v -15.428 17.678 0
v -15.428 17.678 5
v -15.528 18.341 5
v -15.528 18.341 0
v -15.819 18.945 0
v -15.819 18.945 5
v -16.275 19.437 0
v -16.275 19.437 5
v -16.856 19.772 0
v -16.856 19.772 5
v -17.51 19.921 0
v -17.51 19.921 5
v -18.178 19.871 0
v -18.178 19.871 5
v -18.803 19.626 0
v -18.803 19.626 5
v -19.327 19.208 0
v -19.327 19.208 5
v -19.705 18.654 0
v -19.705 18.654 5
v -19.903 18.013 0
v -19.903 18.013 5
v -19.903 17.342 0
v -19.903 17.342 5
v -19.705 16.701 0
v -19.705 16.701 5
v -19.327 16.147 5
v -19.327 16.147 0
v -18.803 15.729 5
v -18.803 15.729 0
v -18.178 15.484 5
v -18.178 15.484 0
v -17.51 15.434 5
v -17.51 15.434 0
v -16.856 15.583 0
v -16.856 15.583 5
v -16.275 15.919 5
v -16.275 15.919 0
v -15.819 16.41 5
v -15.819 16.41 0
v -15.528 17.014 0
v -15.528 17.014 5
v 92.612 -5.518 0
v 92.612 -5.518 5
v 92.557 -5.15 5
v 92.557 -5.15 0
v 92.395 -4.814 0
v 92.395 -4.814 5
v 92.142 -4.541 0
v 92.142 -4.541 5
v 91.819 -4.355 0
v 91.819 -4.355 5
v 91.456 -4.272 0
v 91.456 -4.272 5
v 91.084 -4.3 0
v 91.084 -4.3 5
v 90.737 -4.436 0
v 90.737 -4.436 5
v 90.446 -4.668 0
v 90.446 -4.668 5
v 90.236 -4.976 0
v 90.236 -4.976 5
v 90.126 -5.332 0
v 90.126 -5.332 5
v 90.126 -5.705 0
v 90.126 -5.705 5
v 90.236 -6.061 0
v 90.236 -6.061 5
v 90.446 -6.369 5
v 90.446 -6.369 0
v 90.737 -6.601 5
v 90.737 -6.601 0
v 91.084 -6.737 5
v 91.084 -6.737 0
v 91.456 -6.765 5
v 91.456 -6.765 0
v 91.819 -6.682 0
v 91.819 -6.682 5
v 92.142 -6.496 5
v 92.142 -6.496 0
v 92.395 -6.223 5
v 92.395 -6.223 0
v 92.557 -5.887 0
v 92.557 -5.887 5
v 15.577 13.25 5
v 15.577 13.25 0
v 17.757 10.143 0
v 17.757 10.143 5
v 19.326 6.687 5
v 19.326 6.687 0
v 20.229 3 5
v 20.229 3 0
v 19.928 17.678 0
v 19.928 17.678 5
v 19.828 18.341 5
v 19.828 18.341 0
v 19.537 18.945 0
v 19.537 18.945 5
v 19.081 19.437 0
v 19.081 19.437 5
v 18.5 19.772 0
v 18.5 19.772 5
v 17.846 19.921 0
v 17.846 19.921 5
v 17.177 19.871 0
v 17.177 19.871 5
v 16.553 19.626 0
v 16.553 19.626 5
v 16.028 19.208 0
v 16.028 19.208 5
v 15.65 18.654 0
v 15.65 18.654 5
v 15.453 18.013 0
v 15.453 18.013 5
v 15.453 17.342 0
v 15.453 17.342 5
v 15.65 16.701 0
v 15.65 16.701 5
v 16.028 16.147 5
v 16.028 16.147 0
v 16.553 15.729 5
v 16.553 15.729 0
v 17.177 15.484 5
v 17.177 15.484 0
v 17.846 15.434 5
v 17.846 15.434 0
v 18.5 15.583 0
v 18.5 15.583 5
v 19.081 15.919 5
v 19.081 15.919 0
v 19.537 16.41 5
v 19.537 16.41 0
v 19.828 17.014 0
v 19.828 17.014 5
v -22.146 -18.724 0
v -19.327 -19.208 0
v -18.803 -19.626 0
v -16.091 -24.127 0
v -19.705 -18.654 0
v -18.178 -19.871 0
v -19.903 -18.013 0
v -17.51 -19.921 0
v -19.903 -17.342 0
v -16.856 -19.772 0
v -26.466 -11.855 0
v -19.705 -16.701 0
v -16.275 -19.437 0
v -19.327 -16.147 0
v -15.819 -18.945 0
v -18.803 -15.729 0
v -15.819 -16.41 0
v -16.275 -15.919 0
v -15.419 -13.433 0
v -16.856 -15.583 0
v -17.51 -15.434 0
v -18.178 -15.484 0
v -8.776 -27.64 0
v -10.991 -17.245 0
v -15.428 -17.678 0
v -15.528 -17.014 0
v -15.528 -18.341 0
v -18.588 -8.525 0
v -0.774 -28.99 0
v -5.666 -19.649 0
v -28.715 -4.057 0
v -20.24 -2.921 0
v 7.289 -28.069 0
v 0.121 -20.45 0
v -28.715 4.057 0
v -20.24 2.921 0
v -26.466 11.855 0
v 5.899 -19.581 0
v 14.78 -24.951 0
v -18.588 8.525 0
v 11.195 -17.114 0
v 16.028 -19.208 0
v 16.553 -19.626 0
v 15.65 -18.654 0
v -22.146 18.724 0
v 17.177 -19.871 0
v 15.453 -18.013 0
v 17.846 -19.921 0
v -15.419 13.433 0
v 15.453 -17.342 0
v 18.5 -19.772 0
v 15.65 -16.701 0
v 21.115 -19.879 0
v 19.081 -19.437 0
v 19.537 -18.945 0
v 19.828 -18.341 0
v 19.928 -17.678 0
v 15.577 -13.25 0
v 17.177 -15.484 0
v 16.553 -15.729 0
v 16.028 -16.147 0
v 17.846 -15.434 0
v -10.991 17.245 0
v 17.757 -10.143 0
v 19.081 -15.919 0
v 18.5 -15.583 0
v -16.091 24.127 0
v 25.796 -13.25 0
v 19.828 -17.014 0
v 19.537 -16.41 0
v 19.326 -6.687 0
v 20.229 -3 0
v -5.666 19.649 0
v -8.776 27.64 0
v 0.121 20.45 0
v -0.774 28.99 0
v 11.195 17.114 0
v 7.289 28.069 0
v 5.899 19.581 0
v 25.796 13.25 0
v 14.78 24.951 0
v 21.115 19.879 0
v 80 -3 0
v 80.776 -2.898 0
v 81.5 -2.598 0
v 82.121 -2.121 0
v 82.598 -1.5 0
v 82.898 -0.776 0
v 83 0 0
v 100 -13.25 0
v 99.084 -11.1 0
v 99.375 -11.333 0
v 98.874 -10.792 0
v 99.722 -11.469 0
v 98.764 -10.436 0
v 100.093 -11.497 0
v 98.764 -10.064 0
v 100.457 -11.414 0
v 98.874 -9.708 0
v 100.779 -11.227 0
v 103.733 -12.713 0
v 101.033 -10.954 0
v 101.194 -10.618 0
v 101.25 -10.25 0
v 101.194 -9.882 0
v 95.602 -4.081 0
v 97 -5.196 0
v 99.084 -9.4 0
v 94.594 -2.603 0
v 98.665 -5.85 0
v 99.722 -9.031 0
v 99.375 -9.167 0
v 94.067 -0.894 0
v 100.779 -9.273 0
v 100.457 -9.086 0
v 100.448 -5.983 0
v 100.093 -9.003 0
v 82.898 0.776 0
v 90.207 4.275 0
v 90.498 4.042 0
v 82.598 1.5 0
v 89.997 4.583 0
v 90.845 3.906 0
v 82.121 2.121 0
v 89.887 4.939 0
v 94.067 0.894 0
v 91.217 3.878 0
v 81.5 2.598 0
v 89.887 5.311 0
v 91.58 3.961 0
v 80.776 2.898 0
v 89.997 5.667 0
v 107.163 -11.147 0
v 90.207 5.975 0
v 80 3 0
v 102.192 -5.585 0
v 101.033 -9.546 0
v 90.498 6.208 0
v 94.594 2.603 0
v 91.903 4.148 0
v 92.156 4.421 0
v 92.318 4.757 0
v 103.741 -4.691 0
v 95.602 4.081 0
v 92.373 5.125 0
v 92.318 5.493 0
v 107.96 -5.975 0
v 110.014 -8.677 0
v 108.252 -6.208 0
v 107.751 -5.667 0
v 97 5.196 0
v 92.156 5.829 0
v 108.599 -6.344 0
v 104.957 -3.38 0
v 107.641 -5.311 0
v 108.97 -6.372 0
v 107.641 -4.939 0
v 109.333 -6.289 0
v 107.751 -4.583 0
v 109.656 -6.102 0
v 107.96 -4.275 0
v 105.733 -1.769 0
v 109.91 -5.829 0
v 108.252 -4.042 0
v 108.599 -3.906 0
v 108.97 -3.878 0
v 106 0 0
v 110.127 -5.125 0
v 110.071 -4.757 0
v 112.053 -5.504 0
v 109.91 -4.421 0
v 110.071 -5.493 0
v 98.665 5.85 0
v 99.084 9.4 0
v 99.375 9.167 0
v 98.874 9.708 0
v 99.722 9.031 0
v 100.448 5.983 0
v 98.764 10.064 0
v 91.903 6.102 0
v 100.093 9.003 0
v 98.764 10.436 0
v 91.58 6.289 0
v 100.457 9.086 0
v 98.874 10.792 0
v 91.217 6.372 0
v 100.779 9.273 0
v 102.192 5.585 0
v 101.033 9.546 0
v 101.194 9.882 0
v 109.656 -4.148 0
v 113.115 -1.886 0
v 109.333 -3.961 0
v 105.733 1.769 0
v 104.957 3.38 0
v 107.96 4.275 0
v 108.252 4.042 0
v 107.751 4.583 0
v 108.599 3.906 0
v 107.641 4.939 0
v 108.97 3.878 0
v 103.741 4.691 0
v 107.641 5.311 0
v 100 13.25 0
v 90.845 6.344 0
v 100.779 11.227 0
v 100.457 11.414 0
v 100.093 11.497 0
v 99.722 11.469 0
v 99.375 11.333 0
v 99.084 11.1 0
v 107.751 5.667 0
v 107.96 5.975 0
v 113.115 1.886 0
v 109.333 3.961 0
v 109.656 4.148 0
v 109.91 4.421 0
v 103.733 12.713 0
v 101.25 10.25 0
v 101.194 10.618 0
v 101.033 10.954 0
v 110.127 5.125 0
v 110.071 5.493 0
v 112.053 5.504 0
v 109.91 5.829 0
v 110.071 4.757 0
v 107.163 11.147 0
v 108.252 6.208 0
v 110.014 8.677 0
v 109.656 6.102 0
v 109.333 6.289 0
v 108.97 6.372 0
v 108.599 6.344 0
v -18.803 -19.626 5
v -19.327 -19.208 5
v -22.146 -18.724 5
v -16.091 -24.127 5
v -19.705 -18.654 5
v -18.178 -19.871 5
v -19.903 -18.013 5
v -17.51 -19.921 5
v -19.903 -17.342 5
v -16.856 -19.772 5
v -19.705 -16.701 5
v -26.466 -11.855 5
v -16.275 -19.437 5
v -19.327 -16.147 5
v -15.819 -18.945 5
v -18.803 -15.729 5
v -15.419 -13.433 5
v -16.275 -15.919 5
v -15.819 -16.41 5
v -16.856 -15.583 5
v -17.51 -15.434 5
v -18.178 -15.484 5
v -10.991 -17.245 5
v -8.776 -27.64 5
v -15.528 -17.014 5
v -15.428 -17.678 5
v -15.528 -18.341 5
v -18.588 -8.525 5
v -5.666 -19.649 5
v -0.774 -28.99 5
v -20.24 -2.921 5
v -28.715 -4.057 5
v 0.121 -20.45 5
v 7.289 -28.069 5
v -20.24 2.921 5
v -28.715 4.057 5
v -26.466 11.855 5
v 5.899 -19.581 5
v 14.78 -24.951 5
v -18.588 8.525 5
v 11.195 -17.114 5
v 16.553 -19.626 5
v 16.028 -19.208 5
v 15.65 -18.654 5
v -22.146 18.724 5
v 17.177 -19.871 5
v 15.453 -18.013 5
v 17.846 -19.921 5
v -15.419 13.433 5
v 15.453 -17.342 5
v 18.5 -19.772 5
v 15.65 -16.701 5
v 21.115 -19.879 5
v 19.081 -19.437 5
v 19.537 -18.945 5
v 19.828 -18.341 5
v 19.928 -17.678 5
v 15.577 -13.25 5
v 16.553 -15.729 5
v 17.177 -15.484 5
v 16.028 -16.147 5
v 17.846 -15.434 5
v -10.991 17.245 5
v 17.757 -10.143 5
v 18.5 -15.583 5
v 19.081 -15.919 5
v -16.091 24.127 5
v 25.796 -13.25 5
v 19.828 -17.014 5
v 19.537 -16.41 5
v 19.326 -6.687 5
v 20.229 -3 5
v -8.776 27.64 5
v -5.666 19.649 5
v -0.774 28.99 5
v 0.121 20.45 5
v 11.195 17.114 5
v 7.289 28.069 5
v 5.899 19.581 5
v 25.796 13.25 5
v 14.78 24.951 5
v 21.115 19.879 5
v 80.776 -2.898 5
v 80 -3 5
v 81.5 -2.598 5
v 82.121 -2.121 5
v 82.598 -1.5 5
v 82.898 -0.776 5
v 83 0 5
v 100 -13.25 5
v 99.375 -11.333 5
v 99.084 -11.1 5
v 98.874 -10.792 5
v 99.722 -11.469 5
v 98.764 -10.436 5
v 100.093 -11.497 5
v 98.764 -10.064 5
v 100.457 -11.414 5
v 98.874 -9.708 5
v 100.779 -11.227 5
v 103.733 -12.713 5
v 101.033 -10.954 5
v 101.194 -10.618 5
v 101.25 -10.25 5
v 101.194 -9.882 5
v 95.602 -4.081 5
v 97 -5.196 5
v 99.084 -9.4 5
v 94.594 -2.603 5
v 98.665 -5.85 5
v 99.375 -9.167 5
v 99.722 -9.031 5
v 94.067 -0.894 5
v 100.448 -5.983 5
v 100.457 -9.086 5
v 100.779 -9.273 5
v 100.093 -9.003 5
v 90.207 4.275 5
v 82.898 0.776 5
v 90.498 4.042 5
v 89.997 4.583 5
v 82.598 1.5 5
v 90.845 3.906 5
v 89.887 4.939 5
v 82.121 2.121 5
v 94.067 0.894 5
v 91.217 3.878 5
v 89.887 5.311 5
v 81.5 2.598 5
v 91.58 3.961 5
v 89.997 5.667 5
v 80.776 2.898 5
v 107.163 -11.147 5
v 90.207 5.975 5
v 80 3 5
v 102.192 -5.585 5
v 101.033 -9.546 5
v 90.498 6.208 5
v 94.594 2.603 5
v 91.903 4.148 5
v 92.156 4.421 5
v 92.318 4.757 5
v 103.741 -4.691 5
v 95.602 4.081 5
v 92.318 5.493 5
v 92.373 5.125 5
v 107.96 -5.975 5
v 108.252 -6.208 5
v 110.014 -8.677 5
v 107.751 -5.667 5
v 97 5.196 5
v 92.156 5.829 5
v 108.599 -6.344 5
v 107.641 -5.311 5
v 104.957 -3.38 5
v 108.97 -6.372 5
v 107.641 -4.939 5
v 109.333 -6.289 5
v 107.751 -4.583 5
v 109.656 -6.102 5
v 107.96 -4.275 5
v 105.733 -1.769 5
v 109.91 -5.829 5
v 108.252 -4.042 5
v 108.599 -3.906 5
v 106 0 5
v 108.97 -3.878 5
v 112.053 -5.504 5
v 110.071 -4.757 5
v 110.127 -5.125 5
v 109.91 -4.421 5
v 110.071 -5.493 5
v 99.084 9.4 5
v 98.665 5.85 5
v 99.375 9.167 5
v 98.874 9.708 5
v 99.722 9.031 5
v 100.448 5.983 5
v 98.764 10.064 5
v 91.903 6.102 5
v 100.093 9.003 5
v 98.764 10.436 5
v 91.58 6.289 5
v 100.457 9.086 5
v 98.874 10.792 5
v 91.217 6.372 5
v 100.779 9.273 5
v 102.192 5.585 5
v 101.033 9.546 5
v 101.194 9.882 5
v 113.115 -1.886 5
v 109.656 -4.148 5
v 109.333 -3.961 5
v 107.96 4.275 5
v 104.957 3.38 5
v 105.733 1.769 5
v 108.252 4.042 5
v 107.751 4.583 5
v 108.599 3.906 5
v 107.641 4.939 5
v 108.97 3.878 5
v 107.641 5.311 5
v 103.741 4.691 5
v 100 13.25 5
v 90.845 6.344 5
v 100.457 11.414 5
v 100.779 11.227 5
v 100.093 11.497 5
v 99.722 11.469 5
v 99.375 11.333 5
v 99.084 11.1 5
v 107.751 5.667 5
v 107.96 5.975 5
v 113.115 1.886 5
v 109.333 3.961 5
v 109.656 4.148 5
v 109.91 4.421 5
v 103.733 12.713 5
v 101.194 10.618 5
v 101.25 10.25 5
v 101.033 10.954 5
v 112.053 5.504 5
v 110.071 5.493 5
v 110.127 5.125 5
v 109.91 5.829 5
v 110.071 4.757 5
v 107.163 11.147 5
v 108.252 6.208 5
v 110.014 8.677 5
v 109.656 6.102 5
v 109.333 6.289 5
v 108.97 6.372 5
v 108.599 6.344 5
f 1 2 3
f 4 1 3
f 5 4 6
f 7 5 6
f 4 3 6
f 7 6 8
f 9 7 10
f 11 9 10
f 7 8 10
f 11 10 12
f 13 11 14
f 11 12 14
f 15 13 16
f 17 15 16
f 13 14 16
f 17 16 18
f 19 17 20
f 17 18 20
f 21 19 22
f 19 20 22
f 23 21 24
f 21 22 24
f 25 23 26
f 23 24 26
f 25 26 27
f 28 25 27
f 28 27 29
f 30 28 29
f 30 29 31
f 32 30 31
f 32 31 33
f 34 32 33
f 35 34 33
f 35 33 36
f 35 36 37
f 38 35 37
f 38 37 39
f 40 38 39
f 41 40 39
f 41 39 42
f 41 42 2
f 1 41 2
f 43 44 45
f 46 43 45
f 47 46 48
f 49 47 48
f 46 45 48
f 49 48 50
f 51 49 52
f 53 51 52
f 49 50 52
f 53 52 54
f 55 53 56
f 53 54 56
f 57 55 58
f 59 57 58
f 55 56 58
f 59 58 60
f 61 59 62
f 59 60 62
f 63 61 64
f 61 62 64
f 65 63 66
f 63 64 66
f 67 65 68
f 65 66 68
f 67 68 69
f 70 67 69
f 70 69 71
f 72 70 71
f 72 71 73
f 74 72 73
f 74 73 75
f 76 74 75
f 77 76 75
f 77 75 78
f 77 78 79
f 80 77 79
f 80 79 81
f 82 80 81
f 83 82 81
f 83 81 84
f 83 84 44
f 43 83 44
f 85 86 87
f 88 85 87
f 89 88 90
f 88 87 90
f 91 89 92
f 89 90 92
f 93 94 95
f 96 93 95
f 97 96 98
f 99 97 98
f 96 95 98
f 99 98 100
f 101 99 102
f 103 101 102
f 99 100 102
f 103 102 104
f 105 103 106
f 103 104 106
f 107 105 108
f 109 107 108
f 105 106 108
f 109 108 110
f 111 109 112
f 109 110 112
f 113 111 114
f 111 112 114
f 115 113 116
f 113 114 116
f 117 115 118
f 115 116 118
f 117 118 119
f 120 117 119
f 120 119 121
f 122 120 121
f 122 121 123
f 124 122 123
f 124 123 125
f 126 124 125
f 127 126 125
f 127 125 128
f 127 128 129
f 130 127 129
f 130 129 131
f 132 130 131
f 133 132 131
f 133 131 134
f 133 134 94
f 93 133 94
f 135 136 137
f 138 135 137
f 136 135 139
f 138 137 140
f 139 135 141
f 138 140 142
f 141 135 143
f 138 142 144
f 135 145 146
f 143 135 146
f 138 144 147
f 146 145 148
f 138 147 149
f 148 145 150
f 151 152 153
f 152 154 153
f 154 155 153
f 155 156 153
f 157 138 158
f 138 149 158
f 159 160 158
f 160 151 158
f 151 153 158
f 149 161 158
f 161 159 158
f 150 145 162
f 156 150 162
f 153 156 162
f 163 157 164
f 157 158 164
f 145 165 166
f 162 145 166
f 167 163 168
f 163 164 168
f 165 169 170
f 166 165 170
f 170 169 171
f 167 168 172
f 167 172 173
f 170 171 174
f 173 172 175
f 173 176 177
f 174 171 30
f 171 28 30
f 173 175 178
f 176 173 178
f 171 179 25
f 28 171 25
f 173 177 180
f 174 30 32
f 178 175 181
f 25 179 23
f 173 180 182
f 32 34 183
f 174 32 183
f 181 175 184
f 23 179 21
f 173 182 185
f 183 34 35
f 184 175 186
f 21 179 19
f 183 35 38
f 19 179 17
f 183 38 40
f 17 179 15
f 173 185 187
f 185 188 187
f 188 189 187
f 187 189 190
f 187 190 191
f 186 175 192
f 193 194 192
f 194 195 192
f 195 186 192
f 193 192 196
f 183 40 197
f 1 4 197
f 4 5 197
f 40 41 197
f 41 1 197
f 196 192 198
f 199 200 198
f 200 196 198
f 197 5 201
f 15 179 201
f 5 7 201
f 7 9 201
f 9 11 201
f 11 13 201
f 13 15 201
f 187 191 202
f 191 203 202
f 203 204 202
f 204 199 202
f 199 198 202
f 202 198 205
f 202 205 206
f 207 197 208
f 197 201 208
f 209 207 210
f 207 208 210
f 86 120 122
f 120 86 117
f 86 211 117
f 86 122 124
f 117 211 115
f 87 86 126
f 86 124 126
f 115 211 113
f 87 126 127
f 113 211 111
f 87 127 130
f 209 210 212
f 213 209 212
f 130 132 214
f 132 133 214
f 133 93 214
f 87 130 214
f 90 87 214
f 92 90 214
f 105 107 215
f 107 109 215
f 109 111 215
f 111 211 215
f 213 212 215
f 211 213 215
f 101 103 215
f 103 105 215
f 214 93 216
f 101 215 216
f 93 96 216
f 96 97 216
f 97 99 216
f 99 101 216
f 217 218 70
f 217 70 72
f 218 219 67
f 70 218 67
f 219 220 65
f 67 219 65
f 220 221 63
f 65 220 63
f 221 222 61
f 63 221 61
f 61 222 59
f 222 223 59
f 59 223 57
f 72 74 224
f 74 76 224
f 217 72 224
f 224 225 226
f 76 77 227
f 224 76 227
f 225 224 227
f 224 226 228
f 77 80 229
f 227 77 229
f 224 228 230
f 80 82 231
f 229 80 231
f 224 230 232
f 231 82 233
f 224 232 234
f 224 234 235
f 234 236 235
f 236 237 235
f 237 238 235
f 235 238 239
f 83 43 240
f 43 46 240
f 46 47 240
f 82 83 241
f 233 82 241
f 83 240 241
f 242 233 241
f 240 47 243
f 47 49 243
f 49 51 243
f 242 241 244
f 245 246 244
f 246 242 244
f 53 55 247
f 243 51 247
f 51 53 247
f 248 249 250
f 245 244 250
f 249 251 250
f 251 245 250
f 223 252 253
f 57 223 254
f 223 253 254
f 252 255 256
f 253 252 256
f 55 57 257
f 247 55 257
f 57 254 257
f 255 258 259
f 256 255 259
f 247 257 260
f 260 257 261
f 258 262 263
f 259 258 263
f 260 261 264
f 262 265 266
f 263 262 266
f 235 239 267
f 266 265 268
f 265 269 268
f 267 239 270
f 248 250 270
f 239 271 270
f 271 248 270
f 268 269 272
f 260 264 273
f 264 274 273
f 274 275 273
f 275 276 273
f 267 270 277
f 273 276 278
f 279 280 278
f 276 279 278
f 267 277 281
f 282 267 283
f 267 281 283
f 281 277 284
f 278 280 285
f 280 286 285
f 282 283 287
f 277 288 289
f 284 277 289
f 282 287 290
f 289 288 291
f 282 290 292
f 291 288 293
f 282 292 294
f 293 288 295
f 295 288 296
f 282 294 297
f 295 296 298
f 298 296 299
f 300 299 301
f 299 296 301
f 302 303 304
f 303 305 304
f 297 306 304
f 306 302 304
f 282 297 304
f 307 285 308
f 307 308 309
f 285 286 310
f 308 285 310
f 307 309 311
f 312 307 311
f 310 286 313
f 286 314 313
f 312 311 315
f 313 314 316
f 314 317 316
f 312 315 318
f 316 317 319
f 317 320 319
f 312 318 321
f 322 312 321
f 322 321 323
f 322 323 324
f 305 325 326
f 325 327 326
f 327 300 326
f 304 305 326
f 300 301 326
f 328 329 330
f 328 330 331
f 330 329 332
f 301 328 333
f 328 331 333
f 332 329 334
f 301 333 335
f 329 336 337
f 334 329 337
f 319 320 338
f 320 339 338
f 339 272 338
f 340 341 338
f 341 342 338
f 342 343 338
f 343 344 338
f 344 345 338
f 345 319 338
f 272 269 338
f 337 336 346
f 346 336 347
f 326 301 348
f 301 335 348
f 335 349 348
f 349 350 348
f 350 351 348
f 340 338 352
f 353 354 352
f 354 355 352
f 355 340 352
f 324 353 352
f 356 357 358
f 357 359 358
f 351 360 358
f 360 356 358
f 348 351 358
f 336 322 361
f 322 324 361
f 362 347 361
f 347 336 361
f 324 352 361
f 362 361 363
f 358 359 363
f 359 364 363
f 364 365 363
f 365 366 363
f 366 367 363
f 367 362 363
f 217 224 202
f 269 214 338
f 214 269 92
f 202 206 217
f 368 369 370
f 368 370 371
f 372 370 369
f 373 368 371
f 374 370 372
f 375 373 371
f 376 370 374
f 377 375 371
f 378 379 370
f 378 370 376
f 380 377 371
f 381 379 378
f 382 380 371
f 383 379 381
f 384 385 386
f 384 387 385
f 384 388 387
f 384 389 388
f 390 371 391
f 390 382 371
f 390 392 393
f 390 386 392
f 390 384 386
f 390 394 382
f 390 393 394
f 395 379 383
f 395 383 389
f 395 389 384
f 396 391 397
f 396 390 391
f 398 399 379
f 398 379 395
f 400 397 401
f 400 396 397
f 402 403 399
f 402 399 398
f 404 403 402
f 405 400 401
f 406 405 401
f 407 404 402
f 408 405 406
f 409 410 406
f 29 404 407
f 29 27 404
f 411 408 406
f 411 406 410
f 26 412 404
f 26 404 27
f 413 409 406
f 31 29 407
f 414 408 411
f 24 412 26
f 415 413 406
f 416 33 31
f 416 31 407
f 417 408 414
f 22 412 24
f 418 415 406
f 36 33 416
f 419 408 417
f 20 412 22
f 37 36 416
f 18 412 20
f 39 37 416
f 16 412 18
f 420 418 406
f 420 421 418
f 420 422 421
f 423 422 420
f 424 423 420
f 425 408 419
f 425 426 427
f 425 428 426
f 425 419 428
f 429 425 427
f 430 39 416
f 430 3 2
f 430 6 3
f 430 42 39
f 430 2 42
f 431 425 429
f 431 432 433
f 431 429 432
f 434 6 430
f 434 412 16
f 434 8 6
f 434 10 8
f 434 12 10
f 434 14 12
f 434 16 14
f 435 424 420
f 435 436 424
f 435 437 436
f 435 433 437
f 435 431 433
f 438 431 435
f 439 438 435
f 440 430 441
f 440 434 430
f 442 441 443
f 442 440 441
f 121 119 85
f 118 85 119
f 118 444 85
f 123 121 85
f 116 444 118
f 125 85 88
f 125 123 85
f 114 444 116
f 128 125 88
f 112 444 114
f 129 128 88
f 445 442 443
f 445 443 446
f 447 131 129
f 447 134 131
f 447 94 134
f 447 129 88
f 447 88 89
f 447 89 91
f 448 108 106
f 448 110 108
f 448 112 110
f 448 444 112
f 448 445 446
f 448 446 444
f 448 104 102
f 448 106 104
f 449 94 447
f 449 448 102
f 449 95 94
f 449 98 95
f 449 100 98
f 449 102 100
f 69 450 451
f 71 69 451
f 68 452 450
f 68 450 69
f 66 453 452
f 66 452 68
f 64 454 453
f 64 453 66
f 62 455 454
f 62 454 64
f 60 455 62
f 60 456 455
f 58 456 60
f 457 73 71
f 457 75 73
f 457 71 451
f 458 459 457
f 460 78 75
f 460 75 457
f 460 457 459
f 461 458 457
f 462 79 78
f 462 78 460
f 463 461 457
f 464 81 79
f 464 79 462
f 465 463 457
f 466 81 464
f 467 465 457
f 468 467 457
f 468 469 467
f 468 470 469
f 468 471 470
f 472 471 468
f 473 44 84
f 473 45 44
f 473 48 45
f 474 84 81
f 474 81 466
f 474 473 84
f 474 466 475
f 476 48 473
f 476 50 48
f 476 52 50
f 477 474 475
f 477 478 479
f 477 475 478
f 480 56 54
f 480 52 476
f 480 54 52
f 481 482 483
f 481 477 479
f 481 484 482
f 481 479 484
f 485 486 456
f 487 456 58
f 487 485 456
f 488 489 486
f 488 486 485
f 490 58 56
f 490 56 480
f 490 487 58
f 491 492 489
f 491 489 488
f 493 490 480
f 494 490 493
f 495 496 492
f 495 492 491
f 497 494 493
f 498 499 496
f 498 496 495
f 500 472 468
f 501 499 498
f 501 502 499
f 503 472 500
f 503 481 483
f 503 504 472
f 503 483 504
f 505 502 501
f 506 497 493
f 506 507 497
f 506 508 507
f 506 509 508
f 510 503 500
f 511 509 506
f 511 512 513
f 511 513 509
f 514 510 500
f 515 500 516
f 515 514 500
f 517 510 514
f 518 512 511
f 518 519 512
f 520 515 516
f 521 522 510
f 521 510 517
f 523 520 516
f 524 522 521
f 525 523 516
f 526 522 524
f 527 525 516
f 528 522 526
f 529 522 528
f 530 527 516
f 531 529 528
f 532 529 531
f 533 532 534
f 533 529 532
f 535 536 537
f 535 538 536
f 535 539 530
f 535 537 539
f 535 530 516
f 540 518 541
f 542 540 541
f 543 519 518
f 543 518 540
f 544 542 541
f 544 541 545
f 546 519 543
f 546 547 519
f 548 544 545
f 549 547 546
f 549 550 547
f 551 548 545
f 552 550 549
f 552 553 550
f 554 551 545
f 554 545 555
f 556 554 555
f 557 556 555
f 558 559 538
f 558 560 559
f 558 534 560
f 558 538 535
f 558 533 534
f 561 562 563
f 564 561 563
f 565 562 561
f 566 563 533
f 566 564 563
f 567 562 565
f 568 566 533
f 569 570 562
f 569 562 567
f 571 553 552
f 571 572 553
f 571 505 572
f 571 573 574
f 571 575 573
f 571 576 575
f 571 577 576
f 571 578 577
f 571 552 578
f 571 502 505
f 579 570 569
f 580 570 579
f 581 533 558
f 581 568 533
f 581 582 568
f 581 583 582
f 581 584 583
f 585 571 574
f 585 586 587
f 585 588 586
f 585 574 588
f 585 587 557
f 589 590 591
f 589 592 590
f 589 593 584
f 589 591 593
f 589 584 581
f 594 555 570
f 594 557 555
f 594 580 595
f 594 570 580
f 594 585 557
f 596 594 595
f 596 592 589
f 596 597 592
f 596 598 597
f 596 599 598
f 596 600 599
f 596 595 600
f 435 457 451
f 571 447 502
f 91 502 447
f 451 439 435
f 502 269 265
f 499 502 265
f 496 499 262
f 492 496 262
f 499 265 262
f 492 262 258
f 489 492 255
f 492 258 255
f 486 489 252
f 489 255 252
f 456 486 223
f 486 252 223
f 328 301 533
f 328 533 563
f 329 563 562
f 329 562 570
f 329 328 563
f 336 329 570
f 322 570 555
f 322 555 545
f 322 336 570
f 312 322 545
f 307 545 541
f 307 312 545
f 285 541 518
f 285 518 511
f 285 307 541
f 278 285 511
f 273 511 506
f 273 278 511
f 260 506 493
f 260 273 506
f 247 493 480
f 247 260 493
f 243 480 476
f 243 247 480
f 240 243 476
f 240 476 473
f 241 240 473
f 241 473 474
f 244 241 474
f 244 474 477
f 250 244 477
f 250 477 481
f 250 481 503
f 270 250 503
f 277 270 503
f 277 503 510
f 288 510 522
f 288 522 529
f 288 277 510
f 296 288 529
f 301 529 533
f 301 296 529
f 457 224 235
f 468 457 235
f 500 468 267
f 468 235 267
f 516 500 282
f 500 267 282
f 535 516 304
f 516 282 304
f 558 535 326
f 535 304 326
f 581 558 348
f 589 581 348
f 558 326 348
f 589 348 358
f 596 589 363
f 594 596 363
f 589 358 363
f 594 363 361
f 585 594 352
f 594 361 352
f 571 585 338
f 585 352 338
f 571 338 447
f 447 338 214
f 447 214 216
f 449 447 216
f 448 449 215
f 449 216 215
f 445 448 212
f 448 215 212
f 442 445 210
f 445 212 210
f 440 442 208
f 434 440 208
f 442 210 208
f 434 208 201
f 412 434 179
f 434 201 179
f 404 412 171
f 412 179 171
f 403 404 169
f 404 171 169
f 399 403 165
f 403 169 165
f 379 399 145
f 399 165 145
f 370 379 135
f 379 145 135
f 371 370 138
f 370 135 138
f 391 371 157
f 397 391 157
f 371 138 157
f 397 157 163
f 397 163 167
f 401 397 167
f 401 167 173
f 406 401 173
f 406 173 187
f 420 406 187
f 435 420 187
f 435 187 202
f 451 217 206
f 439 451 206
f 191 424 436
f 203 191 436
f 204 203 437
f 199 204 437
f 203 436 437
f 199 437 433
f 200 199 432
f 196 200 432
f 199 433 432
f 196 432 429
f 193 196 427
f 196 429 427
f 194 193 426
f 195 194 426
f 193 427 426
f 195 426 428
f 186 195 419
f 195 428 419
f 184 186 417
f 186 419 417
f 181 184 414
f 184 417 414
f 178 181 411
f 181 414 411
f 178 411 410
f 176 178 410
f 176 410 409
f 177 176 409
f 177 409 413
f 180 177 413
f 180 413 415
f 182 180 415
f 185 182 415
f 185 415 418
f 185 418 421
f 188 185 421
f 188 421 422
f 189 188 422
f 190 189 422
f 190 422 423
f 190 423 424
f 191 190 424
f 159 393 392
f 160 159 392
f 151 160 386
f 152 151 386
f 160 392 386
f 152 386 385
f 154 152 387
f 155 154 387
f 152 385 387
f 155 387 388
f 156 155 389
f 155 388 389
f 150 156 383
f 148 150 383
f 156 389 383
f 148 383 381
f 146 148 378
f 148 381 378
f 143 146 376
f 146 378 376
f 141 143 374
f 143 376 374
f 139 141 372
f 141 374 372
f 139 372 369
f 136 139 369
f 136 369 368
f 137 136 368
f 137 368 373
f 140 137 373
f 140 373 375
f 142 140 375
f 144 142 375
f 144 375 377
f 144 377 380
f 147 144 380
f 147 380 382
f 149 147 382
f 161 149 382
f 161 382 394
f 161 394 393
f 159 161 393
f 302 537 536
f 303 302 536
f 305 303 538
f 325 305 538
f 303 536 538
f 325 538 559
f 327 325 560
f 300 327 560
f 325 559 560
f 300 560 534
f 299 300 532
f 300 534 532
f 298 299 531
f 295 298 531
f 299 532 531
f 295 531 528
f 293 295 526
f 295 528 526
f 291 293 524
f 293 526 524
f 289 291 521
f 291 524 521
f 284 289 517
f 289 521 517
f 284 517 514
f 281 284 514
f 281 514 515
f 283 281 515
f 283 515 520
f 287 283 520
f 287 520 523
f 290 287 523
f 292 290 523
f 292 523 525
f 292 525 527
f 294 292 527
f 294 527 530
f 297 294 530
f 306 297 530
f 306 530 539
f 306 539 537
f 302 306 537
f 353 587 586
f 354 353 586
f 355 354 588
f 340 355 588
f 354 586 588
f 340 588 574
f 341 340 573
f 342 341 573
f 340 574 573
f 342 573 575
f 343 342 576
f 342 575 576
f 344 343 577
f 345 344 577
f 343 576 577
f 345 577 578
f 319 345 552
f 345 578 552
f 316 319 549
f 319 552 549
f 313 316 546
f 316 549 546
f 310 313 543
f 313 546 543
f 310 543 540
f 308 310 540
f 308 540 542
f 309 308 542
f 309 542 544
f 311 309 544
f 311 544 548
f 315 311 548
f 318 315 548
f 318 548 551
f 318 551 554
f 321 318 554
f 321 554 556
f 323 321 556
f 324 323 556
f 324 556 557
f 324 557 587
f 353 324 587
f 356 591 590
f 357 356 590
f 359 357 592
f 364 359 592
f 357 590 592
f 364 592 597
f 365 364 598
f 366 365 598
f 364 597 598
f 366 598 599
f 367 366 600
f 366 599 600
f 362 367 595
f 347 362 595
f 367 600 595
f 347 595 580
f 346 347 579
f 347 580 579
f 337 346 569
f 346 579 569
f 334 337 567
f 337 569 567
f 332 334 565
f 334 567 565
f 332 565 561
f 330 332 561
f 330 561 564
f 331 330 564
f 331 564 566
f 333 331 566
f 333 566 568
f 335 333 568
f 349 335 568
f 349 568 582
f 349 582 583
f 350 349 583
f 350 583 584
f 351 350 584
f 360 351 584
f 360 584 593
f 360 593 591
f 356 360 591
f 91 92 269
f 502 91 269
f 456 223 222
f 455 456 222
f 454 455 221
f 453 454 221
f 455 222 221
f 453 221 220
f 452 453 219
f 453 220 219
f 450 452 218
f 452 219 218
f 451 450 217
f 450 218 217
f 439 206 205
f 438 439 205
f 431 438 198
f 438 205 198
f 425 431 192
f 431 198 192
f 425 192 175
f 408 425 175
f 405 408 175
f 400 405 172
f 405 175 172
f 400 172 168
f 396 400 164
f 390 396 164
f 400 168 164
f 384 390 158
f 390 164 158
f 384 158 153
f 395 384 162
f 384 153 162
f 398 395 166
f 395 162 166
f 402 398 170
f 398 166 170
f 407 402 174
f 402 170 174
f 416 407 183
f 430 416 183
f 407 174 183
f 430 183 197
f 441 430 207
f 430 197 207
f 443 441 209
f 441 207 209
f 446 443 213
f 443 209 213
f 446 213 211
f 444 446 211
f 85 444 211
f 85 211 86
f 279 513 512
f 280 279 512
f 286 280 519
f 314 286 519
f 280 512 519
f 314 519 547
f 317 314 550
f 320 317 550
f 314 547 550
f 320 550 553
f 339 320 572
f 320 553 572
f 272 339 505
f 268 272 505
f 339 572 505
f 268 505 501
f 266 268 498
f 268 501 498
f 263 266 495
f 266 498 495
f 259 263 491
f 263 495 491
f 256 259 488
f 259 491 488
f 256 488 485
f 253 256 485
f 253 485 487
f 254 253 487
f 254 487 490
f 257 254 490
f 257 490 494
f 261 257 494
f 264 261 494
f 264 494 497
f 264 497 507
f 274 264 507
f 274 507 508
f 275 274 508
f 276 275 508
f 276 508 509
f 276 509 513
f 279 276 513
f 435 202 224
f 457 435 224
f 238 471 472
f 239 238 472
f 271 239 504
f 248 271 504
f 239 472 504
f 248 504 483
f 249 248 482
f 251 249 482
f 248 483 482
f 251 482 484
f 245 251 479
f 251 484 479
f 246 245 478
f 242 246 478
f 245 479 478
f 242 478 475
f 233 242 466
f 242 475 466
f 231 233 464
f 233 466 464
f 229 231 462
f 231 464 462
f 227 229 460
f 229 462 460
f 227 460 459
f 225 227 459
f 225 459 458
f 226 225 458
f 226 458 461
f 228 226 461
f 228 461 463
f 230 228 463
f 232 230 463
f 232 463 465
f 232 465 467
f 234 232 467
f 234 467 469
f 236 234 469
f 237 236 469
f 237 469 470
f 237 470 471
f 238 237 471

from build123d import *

# Parameters (mm, degrees)
SKETCH2_R           = 13.25
SKETCH2_R_2         = 6
BOSS_EXTRUDE1_DEPTH = 5
SKETCH3_R           = 2.25
SKETCH3_R_2         = 1.25
CUT_EXTRUDE1_DEPTH  = 6


with BuildPart() as part:
    # Sketch2 → Boss-Extrude1 (new body)
    with BuildSketch(Plane.XY):
        with BuildLine():
            ThreePointArc((15.576905983, -13.25), (-20.45, 0), (15.576905983, 13.25))
            Line((15.576905983, 13.25), (25.796075283, 13.25))
            ThreePointArc((25.796075283, 13.25), (-29, 0), (25.796075283, -13.25))
            Line((25.796075283, -13.25), (15.576905983, -13.25))
        make_face()
        with BuildLine():
            ThreePointArc((20.228754287, -3), (18.621948121, -8.451363686), (15.576905983, -13.25))
            Line((15.576905983, -13.25), (25.796075283, -13.25))
            ThreePointArc((25.796075283, -13.25), (27.796785579, -8.266723138), (28.844410204, -3))
            Line((28.844410204, -3), (20.228754287, -3))
        make_face()
        with BuildLine():
            Line((25.796075283, 13.25), (15.576905983, 13.25))
            ThreePointArc((15.576905983, 13.25), (18.621948121, 8.451363686), (20.228754287, 3))
            Line((20.228754287, 3), (28.844410204, 3))
            ThreePointArc((28.844410204, 3), (27.796785579, 8.266723138), (25.796075283, 13.25))
        make_face()
        with BuildLine():
            Line((100, 13.25), (25.796075283, 13.25))
            ThreePointArc((25.796075283, 13.25), (27.796785579, 8.266723138), (28.844410204, 3))
            Line((28.844410204, 3), (50, 3))
            Line((50, 3), (80, 3))
            ThreePointArc((80, 3), (82.121320344, 2.121320344), (83, 0))
            ThreePointArc((83, 0), (82.121320344, -2.121320344), (80, -3))
            Line((80, -3), (50, -3))
            Line((50, -3), (28.844410204, -3))
            ThreePointArc((28.844410204, -3), (27.796785579, -8.266723138), (25.796075283, -13.25))
            Line((25.796075283, -13.25), (100, -13.25))
            ThreePointArc((100, -13.25), (86.75, 0), (100, 13.25))
        make_face()
        with Locations((100, 0)):
            Circle(SKETCH2_R)
        with Locations((100, 0)):
            Circle(SKETCH2_R_2, mode=Mode.SUBTRACT)
    extrude(amount=BOSS_EXTRUDE1_DEPTH)

    # Sketch3 → Cut-Extrude1 (cut, through all)
    with BuildSketch(Plane.XY.offset(5)):
        with Locations((17.67766953, 17.67766953)):
            Circle(SKETCH3_R)
        with Locations((17.67766953, -17.67766953)):
            Circle(SKETCH3_R)
        with Locations((-17.67766953, -17.67766953)):
            Circle(SKETCH3_R)
        with Locations((-17.67766953, 17.67766953)):
            Circle(SKETCH3_R)
        with Locations((100, 10.25)):
            Circle(SKETCH3_R_2)
        with Locations((108.876760389, 5.125)):
            Circle(SKETCH3_R_2)
        with Locations((91.123239611, 5.125)):
            Circle(SKETCH3_R_2)
        with Locations((91.362305232, -5.518399142)):
            Circle(SKETCH3_R_2)
        with Locations((108.876760389, -5.125)):
            Circle(SKETCH3_R_2)
        with Locations((100, -10.25)):
            Circle(SKETCH3_R_2)
    extrude(amount=-CUT_EXTRUDE1_DEPTH, mode=Mode.SUBTRACT)


solid = part.part
